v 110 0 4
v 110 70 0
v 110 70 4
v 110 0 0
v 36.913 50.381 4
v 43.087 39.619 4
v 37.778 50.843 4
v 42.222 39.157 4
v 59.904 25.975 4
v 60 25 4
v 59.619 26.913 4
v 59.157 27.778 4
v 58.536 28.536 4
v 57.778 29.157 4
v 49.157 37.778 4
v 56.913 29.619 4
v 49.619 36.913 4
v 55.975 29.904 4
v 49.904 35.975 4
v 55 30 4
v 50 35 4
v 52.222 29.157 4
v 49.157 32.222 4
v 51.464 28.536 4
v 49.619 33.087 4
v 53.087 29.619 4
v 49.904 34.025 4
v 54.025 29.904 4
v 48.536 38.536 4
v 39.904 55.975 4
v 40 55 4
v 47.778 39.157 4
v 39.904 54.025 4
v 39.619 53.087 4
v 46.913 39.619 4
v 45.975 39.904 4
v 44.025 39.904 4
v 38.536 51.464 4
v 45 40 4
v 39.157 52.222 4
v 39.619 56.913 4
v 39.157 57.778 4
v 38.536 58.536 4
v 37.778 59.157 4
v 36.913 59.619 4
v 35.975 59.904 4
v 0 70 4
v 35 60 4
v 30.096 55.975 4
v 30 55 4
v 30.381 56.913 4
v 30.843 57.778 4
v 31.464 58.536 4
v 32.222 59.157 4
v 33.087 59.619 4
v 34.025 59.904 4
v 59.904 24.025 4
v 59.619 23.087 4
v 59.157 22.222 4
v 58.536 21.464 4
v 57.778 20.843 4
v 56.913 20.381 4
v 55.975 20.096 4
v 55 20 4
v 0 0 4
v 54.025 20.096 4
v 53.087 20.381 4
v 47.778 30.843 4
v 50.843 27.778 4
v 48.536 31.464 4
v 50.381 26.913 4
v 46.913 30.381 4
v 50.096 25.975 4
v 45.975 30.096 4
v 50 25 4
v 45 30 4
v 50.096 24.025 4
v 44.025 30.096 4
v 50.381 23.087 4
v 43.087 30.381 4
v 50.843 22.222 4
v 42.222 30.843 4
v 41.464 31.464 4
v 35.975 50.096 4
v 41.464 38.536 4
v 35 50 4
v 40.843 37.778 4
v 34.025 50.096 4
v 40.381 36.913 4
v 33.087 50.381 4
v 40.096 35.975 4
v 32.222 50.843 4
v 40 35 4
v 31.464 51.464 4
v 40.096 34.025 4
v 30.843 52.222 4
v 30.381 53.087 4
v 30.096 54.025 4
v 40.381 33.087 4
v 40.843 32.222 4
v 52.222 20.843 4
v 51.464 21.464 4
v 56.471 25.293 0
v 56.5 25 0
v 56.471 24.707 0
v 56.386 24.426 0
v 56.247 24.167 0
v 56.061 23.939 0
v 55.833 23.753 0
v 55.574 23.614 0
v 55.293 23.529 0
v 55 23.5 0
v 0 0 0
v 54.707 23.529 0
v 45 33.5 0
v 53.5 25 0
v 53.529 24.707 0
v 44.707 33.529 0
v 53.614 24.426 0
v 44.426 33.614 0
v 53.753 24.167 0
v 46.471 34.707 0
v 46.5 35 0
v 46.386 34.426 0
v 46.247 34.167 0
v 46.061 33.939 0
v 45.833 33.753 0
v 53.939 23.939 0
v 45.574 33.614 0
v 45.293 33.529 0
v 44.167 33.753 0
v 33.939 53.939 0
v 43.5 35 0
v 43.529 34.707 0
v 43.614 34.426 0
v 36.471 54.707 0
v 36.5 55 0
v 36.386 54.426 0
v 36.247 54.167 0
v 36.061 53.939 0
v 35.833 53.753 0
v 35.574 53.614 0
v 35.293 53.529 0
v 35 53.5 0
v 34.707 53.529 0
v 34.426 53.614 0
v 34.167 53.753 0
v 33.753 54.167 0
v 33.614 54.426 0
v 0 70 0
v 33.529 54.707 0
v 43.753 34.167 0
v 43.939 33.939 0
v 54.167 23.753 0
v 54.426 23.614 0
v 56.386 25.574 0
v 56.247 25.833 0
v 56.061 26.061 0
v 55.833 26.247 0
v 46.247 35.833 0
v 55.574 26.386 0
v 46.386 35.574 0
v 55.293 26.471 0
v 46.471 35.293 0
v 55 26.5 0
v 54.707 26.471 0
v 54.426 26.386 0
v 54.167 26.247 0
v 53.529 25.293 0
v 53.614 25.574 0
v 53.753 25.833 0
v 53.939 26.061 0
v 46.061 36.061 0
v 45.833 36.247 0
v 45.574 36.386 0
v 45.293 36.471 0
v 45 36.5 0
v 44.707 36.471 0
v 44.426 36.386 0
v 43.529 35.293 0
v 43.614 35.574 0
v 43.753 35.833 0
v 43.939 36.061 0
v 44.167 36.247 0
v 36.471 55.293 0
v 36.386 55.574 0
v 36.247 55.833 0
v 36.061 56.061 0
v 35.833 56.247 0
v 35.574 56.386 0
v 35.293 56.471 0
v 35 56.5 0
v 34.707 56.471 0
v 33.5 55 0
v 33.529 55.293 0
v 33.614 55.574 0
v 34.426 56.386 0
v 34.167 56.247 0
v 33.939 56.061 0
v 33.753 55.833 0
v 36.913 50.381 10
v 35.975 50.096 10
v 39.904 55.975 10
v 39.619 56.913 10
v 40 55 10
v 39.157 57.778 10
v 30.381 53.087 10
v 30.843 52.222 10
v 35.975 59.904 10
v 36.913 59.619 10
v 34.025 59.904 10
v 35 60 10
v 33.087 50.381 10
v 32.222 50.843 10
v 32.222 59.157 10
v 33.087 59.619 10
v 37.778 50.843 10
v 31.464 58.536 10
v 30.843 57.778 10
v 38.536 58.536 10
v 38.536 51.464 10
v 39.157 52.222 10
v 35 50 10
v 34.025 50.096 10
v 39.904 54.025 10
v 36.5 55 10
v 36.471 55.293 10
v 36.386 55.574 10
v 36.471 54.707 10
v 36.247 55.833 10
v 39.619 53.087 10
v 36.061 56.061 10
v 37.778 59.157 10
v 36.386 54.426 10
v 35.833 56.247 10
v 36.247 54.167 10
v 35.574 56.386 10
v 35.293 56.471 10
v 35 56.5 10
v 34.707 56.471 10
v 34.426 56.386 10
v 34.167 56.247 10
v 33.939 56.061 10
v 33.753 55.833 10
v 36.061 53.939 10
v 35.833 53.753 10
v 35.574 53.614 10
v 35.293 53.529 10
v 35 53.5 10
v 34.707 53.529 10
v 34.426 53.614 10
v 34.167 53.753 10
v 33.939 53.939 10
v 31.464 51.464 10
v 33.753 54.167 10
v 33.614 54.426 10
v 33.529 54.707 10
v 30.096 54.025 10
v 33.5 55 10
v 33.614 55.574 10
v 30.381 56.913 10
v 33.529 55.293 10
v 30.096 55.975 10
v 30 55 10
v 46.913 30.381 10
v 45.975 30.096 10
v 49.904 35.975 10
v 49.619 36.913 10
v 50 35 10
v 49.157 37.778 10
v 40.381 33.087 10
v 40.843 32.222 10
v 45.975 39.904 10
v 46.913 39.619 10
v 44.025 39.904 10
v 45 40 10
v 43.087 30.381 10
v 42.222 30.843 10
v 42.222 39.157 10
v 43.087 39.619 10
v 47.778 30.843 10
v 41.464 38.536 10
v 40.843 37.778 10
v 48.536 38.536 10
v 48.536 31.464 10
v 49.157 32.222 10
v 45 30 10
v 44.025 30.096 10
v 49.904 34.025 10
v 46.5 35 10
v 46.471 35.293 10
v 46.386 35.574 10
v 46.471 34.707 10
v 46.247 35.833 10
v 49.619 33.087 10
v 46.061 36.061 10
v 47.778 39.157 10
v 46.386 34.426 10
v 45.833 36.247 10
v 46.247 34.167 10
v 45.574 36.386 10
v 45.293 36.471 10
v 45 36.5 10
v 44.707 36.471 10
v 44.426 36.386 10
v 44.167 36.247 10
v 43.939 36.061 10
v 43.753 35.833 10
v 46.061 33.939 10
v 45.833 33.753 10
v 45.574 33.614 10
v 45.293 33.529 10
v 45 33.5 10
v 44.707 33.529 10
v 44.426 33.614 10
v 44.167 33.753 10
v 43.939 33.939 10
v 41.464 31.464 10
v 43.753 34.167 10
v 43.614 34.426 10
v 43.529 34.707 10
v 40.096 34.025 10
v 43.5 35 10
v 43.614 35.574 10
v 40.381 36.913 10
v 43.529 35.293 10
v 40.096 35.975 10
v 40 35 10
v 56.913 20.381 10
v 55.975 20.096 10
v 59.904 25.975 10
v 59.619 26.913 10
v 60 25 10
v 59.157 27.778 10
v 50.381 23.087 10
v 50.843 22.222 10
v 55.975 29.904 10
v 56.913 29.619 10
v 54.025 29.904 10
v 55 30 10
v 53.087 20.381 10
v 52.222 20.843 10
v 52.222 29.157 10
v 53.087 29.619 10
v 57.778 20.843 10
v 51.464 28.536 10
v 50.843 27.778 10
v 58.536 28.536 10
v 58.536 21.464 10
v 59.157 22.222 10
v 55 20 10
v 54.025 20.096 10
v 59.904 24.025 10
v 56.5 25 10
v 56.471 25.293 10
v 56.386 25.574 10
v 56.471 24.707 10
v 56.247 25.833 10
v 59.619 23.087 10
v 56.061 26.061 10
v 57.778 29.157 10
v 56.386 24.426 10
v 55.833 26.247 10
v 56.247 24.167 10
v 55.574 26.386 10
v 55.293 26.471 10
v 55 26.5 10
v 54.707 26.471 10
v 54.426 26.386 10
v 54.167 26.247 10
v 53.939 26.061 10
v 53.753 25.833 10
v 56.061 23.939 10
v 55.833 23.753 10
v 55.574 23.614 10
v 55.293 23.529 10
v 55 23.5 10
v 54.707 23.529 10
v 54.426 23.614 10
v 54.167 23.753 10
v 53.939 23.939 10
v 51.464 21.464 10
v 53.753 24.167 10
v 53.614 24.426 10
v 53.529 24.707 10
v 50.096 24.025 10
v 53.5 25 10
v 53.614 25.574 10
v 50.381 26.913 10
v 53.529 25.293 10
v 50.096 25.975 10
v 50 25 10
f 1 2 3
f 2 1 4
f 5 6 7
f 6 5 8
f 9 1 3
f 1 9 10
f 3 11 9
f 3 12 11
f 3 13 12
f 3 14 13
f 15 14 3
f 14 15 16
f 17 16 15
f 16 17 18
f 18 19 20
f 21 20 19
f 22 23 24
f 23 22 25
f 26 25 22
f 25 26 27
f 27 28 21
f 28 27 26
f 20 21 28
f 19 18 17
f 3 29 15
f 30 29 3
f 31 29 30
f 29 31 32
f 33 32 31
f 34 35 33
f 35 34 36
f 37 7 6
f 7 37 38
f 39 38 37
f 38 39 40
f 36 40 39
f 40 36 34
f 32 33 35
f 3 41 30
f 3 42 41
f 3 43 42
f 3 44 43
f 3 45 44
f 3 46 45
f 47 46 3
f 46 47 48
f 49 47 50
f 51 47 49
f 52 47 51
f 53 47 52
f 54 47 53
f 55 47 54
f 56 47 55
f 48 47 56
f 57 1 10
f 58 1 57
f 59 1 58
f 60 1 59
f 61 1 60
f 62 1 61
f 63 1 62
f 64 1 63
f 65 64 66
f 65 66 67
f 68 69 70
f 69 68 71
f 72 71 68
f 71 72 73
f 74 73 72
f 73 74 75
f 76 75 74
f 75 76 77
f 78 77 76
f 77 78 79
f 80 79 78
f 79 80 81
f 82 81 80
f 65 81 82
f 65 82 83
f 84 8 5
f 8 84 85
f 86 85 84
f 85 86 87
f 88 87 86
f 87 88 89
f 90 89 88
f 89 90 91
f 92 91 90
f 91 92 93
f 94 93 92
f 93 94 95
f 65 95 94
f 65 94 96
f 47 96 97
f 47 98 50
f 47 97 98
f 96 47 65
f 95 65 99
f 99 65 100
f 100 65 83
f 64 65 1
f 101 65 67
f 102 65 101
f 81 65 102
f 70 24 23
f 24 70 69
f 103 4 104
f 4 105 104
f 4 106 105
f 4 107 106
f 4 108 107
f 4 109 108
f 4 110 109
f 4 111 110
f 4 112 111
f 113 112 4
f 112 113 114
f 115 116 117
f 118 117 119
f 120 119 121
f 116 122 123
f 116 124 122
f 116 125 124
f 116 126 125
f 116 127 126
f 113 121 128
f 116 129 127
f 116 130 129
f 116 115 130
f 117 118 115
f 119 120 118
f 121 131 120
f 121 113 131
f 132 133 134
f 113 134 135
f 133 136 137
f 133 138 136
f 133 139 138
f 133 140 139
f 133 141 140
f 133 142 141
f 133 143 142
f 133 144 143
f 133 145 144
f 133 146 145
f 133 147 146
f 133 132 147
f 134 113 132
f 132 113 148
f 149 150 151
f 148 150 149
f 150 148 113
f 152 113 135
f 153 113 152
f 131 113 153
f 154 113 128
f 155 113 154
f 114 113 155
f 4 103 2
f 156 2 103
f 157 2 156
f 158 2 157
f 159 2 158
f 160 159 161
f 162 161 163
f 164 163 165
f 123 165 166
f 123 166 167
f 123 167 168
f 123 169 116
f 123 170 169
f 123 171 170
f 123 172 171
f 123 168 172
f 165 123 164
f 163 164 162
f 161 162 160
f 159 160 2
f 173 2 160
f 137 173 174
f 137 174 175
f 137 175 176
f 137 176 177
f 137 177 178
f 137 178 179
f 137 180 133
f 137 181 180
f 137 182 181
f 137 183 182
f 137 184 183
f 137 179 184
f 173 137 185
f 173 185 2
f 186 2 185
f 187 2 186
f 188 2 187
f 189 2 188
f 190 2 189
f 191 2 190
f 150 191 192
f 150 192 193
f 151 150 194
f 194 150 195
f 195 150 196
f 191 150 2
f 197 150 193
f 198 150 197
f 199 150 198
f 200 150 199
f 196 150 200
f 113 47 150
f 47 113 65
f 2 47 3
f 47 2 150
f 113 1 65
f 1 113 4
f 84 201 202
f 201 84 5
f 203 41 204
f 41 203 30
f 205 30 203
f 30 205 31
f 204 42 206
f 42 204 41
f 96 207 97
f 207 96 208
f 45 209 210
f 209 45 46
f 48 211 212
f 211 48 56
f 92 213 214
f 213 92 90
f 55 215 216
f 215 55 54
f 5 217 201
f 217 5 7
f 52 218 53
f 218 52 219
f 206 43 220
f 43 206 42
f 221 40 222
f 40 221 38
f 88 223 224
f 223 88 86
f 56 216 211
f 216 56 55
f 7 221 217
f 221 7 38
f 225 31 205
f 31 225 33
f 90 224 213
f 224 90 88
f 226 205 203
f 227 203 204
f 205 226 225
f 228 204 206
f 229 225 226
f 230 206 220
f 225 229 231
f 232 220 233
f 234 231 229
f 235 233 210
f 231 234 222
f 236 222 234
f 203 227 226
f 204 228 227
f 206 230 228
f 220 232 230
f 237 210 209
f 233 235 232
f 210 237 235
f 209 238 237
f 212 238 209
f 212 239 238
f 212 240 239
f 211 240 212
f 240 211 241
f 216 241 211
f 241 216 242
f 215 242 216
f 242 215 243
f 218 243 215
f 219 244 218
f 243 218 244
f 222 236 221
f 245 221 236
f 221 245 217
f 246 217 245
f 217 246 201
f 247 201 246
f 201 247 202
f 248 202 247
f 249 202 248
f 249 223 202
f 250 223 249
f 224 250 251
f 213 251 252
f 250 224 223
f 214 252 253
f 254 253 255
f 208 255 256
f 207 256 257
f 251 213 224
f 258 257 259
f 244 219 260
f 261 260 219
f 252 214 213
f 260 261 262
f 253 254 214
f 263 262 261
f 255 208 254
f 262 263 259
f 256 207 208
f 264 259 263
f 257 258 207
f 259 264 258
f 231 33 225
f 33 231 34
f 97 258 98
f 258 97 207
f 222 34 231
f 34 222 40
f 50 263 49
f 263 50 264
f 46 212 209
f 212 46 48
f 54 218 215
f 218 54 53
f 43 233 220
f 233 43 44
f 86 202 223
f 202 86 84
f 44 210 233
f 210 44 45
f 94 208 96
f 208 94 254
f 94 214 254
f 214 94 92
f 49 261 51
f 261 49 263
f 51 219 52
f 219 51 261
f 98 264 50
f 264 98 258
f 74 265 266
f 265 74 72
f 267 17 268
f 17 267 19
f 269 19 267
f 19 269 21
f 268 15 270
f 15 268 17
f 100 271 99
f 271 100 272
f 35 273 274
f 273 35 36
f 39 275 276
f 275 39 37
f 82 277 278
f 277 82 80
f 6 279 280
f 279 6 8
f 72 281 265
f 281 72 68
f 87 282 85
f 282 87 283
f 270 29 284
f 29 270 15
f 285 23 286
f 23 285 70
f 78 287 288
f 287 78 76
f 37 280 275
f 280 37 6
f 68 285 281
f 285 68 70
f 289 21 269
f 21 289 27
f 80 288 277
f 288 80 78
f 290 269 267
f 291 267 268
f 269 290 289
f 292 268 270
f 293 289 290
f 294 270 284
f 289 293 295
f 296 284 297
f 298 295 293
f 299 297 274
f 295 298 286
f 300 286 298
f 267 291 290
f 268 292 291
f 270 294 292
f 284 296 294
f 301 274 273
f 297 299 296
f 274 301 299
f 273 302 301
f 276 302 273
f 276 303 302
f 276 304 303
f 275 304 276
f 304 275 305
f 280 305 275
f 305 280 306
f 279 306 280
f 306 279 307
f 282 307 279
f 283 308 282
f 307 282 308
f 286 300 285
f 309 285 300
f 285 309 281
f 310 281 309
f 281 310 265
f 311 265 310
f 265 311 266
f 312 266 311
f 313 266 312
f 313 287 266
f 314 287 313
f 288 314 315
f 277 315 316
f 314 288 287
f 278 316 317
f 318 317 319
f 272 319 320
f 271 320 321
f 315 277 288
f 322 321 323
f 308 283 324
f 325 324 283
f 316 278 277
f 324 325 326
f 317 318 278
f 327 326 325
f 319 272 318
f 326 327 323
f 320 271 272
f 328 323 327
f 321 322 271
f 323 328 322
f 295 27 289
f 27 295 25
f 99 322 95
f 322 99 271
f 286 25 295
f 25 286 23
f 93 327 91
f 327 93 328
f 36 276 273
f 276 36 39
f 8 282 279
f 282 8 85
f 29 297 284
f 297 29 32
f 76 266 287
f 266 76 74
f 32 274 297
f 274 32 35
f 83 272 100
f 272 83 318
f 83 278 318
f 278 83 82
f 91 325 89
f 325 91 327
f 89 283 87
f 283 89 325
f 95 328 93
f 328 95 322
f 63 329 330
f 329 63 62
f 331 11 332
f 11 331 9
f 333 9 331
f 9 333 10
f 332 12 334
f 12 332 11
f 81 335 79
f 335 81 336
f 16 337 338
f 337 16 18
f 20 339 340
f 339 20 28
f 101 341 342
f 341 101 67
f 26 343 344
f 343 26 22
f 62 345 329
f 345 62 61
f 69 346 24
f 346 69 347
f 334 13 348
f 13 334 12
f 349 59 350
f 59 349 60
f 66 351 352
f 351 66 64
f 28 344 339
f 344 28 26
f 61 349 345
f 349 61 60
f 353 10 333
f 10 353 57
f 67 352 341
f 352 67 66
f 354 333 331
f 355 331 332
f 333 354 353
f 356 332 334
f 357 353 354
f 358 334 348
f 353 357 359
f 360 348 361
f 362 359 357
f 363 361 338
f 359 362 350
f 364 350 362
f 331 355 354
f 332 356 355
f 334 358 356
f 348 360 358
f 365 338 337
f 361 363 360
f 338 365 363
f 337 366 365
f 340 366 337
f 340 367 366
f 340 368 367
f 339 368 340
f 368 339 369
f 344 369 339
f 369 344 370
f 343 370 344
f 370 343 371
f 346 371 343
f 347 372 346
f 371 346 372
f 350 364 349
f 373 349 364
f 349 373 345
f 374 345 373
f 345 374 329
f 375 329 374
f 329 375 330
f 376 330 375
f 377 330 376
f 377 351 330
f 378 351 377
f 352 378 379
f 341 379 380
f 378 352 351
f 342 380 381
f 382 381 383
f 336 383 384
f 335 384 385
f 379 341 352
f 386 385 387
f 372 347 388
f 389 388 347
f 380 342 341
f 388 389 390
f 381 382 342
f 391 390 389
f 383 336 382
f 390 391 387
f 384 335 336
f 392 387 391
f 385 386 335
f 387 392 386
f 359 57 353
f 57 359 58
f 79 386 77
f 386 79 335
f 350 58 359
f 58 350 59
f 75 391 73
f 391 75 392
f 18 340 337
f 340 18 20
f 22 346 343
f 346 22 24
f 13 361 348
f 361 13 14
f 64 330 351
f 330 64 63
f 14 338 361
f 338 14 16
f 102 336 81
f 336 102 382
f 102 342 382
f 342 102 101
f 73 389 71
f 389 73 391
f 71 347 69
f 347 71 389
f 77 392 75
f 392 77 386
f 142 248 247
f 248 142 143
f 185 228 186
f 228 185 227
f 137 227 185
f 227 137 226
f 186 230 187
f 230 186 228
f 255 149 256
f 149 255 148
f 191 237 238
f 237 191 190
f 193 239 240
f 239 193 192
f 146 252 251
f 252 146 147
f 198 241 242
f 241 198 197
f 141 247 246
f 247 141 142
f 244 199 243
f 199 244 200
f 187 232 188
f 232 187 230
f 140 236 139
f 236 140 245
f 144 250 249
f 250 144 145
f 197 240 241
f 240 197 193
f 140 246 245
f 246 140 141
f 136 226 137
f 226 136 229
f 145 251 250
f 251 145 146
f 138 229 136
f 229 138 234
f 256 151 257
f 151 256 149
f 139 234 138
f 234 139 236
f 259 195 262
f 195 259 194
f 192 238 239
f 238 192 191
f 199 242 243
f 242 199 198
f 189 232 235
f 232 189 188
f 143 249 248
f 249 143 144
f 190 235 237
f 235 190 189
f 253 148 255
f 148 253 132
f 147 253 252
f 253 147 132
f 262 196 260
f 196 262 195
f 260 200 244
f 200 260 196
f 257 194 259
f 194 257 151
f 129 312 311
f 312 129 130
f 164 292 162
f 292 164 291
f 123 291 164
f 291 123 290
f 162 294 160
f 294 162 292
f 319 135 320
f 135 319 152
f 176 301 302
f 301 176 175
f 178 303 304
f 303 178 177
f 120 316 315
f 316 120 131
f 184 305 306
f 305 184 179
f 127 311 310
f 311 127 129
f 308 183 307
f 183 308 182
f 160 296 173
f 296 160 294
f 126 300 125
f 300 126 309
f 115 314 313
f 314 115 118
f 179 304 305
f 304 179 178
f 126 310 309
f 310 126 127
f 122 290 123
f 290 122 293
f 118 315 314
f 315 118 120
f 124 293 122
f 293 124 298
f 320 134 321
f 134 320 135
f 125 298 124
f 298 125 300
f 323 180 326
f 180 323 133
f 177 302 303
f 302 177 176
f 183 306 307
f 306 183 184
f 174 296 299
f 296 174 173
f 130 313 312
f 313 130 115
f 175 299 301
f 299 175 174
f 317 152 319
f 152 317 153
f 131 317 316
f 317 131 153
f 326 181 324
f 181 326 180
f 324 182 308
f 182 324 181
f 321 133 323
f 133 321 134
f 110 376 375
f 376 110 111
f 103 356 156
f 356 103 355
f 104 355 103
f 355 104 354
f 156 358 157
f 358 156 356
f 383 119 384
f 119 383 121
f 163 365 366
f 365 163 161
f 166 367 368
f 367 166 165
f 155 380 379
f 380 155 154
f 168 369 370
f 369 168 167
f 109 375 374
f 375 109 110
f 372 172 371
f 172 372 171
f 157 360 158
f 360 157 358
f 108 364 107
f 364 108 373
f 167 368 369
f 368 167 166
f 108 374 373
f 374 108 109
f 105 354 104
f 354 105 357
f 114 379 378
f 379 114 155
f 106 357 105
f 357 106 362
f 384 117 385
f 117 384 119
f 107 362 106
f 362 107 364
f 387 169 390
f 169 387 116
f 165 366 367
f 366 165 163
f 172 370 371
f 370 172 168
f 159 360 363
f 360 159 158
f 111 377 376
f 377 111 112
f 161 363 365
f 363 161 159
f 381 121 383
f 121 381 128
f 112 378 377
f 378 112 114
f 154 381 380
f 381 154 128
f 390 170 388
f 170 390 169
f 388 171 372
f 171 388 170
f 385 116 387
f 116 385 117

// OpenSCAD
$fn = 32;

// ----------------------------------------------------------------------
// Boss field: plate with bosses at given coordinates
// ----------------------------------------------------------------------

// --- parameters (mm) ---
plate_l = 110;            // plate length, X
plate_w = 70;             // plate width, Y
plate_t = 4;              // plate thickness, Z
boss_d = 10;              // boss diameter
boss_h = 6;               // boss height above the plate
bore_d = 3;               // boss bore

total_h = plate_t + boss_h;  // overall height

difference() {
  union() {
    cube([plate_l, plate_w, plate_t]);
    translate([35, 55, plate_t]) cylinder(h = boss_h, d = boss_d);
    translate([45, 35, plate_t]) cylinder(h = boss_h, d = boss_d);
    translate([55, 25, plate_t]) cylinder(h = boss_h, d = boss_d);
  }
  translate([35, 55, -1]) cylinder(h = total_h + 2, d = bore_d);
  translate([45, 35, -1]) cylinder(h = total_h + 2, d = bore_d);
  translate([55, 25, -1]) cylinder(h = total_h + 2, d = bore_d);
}
